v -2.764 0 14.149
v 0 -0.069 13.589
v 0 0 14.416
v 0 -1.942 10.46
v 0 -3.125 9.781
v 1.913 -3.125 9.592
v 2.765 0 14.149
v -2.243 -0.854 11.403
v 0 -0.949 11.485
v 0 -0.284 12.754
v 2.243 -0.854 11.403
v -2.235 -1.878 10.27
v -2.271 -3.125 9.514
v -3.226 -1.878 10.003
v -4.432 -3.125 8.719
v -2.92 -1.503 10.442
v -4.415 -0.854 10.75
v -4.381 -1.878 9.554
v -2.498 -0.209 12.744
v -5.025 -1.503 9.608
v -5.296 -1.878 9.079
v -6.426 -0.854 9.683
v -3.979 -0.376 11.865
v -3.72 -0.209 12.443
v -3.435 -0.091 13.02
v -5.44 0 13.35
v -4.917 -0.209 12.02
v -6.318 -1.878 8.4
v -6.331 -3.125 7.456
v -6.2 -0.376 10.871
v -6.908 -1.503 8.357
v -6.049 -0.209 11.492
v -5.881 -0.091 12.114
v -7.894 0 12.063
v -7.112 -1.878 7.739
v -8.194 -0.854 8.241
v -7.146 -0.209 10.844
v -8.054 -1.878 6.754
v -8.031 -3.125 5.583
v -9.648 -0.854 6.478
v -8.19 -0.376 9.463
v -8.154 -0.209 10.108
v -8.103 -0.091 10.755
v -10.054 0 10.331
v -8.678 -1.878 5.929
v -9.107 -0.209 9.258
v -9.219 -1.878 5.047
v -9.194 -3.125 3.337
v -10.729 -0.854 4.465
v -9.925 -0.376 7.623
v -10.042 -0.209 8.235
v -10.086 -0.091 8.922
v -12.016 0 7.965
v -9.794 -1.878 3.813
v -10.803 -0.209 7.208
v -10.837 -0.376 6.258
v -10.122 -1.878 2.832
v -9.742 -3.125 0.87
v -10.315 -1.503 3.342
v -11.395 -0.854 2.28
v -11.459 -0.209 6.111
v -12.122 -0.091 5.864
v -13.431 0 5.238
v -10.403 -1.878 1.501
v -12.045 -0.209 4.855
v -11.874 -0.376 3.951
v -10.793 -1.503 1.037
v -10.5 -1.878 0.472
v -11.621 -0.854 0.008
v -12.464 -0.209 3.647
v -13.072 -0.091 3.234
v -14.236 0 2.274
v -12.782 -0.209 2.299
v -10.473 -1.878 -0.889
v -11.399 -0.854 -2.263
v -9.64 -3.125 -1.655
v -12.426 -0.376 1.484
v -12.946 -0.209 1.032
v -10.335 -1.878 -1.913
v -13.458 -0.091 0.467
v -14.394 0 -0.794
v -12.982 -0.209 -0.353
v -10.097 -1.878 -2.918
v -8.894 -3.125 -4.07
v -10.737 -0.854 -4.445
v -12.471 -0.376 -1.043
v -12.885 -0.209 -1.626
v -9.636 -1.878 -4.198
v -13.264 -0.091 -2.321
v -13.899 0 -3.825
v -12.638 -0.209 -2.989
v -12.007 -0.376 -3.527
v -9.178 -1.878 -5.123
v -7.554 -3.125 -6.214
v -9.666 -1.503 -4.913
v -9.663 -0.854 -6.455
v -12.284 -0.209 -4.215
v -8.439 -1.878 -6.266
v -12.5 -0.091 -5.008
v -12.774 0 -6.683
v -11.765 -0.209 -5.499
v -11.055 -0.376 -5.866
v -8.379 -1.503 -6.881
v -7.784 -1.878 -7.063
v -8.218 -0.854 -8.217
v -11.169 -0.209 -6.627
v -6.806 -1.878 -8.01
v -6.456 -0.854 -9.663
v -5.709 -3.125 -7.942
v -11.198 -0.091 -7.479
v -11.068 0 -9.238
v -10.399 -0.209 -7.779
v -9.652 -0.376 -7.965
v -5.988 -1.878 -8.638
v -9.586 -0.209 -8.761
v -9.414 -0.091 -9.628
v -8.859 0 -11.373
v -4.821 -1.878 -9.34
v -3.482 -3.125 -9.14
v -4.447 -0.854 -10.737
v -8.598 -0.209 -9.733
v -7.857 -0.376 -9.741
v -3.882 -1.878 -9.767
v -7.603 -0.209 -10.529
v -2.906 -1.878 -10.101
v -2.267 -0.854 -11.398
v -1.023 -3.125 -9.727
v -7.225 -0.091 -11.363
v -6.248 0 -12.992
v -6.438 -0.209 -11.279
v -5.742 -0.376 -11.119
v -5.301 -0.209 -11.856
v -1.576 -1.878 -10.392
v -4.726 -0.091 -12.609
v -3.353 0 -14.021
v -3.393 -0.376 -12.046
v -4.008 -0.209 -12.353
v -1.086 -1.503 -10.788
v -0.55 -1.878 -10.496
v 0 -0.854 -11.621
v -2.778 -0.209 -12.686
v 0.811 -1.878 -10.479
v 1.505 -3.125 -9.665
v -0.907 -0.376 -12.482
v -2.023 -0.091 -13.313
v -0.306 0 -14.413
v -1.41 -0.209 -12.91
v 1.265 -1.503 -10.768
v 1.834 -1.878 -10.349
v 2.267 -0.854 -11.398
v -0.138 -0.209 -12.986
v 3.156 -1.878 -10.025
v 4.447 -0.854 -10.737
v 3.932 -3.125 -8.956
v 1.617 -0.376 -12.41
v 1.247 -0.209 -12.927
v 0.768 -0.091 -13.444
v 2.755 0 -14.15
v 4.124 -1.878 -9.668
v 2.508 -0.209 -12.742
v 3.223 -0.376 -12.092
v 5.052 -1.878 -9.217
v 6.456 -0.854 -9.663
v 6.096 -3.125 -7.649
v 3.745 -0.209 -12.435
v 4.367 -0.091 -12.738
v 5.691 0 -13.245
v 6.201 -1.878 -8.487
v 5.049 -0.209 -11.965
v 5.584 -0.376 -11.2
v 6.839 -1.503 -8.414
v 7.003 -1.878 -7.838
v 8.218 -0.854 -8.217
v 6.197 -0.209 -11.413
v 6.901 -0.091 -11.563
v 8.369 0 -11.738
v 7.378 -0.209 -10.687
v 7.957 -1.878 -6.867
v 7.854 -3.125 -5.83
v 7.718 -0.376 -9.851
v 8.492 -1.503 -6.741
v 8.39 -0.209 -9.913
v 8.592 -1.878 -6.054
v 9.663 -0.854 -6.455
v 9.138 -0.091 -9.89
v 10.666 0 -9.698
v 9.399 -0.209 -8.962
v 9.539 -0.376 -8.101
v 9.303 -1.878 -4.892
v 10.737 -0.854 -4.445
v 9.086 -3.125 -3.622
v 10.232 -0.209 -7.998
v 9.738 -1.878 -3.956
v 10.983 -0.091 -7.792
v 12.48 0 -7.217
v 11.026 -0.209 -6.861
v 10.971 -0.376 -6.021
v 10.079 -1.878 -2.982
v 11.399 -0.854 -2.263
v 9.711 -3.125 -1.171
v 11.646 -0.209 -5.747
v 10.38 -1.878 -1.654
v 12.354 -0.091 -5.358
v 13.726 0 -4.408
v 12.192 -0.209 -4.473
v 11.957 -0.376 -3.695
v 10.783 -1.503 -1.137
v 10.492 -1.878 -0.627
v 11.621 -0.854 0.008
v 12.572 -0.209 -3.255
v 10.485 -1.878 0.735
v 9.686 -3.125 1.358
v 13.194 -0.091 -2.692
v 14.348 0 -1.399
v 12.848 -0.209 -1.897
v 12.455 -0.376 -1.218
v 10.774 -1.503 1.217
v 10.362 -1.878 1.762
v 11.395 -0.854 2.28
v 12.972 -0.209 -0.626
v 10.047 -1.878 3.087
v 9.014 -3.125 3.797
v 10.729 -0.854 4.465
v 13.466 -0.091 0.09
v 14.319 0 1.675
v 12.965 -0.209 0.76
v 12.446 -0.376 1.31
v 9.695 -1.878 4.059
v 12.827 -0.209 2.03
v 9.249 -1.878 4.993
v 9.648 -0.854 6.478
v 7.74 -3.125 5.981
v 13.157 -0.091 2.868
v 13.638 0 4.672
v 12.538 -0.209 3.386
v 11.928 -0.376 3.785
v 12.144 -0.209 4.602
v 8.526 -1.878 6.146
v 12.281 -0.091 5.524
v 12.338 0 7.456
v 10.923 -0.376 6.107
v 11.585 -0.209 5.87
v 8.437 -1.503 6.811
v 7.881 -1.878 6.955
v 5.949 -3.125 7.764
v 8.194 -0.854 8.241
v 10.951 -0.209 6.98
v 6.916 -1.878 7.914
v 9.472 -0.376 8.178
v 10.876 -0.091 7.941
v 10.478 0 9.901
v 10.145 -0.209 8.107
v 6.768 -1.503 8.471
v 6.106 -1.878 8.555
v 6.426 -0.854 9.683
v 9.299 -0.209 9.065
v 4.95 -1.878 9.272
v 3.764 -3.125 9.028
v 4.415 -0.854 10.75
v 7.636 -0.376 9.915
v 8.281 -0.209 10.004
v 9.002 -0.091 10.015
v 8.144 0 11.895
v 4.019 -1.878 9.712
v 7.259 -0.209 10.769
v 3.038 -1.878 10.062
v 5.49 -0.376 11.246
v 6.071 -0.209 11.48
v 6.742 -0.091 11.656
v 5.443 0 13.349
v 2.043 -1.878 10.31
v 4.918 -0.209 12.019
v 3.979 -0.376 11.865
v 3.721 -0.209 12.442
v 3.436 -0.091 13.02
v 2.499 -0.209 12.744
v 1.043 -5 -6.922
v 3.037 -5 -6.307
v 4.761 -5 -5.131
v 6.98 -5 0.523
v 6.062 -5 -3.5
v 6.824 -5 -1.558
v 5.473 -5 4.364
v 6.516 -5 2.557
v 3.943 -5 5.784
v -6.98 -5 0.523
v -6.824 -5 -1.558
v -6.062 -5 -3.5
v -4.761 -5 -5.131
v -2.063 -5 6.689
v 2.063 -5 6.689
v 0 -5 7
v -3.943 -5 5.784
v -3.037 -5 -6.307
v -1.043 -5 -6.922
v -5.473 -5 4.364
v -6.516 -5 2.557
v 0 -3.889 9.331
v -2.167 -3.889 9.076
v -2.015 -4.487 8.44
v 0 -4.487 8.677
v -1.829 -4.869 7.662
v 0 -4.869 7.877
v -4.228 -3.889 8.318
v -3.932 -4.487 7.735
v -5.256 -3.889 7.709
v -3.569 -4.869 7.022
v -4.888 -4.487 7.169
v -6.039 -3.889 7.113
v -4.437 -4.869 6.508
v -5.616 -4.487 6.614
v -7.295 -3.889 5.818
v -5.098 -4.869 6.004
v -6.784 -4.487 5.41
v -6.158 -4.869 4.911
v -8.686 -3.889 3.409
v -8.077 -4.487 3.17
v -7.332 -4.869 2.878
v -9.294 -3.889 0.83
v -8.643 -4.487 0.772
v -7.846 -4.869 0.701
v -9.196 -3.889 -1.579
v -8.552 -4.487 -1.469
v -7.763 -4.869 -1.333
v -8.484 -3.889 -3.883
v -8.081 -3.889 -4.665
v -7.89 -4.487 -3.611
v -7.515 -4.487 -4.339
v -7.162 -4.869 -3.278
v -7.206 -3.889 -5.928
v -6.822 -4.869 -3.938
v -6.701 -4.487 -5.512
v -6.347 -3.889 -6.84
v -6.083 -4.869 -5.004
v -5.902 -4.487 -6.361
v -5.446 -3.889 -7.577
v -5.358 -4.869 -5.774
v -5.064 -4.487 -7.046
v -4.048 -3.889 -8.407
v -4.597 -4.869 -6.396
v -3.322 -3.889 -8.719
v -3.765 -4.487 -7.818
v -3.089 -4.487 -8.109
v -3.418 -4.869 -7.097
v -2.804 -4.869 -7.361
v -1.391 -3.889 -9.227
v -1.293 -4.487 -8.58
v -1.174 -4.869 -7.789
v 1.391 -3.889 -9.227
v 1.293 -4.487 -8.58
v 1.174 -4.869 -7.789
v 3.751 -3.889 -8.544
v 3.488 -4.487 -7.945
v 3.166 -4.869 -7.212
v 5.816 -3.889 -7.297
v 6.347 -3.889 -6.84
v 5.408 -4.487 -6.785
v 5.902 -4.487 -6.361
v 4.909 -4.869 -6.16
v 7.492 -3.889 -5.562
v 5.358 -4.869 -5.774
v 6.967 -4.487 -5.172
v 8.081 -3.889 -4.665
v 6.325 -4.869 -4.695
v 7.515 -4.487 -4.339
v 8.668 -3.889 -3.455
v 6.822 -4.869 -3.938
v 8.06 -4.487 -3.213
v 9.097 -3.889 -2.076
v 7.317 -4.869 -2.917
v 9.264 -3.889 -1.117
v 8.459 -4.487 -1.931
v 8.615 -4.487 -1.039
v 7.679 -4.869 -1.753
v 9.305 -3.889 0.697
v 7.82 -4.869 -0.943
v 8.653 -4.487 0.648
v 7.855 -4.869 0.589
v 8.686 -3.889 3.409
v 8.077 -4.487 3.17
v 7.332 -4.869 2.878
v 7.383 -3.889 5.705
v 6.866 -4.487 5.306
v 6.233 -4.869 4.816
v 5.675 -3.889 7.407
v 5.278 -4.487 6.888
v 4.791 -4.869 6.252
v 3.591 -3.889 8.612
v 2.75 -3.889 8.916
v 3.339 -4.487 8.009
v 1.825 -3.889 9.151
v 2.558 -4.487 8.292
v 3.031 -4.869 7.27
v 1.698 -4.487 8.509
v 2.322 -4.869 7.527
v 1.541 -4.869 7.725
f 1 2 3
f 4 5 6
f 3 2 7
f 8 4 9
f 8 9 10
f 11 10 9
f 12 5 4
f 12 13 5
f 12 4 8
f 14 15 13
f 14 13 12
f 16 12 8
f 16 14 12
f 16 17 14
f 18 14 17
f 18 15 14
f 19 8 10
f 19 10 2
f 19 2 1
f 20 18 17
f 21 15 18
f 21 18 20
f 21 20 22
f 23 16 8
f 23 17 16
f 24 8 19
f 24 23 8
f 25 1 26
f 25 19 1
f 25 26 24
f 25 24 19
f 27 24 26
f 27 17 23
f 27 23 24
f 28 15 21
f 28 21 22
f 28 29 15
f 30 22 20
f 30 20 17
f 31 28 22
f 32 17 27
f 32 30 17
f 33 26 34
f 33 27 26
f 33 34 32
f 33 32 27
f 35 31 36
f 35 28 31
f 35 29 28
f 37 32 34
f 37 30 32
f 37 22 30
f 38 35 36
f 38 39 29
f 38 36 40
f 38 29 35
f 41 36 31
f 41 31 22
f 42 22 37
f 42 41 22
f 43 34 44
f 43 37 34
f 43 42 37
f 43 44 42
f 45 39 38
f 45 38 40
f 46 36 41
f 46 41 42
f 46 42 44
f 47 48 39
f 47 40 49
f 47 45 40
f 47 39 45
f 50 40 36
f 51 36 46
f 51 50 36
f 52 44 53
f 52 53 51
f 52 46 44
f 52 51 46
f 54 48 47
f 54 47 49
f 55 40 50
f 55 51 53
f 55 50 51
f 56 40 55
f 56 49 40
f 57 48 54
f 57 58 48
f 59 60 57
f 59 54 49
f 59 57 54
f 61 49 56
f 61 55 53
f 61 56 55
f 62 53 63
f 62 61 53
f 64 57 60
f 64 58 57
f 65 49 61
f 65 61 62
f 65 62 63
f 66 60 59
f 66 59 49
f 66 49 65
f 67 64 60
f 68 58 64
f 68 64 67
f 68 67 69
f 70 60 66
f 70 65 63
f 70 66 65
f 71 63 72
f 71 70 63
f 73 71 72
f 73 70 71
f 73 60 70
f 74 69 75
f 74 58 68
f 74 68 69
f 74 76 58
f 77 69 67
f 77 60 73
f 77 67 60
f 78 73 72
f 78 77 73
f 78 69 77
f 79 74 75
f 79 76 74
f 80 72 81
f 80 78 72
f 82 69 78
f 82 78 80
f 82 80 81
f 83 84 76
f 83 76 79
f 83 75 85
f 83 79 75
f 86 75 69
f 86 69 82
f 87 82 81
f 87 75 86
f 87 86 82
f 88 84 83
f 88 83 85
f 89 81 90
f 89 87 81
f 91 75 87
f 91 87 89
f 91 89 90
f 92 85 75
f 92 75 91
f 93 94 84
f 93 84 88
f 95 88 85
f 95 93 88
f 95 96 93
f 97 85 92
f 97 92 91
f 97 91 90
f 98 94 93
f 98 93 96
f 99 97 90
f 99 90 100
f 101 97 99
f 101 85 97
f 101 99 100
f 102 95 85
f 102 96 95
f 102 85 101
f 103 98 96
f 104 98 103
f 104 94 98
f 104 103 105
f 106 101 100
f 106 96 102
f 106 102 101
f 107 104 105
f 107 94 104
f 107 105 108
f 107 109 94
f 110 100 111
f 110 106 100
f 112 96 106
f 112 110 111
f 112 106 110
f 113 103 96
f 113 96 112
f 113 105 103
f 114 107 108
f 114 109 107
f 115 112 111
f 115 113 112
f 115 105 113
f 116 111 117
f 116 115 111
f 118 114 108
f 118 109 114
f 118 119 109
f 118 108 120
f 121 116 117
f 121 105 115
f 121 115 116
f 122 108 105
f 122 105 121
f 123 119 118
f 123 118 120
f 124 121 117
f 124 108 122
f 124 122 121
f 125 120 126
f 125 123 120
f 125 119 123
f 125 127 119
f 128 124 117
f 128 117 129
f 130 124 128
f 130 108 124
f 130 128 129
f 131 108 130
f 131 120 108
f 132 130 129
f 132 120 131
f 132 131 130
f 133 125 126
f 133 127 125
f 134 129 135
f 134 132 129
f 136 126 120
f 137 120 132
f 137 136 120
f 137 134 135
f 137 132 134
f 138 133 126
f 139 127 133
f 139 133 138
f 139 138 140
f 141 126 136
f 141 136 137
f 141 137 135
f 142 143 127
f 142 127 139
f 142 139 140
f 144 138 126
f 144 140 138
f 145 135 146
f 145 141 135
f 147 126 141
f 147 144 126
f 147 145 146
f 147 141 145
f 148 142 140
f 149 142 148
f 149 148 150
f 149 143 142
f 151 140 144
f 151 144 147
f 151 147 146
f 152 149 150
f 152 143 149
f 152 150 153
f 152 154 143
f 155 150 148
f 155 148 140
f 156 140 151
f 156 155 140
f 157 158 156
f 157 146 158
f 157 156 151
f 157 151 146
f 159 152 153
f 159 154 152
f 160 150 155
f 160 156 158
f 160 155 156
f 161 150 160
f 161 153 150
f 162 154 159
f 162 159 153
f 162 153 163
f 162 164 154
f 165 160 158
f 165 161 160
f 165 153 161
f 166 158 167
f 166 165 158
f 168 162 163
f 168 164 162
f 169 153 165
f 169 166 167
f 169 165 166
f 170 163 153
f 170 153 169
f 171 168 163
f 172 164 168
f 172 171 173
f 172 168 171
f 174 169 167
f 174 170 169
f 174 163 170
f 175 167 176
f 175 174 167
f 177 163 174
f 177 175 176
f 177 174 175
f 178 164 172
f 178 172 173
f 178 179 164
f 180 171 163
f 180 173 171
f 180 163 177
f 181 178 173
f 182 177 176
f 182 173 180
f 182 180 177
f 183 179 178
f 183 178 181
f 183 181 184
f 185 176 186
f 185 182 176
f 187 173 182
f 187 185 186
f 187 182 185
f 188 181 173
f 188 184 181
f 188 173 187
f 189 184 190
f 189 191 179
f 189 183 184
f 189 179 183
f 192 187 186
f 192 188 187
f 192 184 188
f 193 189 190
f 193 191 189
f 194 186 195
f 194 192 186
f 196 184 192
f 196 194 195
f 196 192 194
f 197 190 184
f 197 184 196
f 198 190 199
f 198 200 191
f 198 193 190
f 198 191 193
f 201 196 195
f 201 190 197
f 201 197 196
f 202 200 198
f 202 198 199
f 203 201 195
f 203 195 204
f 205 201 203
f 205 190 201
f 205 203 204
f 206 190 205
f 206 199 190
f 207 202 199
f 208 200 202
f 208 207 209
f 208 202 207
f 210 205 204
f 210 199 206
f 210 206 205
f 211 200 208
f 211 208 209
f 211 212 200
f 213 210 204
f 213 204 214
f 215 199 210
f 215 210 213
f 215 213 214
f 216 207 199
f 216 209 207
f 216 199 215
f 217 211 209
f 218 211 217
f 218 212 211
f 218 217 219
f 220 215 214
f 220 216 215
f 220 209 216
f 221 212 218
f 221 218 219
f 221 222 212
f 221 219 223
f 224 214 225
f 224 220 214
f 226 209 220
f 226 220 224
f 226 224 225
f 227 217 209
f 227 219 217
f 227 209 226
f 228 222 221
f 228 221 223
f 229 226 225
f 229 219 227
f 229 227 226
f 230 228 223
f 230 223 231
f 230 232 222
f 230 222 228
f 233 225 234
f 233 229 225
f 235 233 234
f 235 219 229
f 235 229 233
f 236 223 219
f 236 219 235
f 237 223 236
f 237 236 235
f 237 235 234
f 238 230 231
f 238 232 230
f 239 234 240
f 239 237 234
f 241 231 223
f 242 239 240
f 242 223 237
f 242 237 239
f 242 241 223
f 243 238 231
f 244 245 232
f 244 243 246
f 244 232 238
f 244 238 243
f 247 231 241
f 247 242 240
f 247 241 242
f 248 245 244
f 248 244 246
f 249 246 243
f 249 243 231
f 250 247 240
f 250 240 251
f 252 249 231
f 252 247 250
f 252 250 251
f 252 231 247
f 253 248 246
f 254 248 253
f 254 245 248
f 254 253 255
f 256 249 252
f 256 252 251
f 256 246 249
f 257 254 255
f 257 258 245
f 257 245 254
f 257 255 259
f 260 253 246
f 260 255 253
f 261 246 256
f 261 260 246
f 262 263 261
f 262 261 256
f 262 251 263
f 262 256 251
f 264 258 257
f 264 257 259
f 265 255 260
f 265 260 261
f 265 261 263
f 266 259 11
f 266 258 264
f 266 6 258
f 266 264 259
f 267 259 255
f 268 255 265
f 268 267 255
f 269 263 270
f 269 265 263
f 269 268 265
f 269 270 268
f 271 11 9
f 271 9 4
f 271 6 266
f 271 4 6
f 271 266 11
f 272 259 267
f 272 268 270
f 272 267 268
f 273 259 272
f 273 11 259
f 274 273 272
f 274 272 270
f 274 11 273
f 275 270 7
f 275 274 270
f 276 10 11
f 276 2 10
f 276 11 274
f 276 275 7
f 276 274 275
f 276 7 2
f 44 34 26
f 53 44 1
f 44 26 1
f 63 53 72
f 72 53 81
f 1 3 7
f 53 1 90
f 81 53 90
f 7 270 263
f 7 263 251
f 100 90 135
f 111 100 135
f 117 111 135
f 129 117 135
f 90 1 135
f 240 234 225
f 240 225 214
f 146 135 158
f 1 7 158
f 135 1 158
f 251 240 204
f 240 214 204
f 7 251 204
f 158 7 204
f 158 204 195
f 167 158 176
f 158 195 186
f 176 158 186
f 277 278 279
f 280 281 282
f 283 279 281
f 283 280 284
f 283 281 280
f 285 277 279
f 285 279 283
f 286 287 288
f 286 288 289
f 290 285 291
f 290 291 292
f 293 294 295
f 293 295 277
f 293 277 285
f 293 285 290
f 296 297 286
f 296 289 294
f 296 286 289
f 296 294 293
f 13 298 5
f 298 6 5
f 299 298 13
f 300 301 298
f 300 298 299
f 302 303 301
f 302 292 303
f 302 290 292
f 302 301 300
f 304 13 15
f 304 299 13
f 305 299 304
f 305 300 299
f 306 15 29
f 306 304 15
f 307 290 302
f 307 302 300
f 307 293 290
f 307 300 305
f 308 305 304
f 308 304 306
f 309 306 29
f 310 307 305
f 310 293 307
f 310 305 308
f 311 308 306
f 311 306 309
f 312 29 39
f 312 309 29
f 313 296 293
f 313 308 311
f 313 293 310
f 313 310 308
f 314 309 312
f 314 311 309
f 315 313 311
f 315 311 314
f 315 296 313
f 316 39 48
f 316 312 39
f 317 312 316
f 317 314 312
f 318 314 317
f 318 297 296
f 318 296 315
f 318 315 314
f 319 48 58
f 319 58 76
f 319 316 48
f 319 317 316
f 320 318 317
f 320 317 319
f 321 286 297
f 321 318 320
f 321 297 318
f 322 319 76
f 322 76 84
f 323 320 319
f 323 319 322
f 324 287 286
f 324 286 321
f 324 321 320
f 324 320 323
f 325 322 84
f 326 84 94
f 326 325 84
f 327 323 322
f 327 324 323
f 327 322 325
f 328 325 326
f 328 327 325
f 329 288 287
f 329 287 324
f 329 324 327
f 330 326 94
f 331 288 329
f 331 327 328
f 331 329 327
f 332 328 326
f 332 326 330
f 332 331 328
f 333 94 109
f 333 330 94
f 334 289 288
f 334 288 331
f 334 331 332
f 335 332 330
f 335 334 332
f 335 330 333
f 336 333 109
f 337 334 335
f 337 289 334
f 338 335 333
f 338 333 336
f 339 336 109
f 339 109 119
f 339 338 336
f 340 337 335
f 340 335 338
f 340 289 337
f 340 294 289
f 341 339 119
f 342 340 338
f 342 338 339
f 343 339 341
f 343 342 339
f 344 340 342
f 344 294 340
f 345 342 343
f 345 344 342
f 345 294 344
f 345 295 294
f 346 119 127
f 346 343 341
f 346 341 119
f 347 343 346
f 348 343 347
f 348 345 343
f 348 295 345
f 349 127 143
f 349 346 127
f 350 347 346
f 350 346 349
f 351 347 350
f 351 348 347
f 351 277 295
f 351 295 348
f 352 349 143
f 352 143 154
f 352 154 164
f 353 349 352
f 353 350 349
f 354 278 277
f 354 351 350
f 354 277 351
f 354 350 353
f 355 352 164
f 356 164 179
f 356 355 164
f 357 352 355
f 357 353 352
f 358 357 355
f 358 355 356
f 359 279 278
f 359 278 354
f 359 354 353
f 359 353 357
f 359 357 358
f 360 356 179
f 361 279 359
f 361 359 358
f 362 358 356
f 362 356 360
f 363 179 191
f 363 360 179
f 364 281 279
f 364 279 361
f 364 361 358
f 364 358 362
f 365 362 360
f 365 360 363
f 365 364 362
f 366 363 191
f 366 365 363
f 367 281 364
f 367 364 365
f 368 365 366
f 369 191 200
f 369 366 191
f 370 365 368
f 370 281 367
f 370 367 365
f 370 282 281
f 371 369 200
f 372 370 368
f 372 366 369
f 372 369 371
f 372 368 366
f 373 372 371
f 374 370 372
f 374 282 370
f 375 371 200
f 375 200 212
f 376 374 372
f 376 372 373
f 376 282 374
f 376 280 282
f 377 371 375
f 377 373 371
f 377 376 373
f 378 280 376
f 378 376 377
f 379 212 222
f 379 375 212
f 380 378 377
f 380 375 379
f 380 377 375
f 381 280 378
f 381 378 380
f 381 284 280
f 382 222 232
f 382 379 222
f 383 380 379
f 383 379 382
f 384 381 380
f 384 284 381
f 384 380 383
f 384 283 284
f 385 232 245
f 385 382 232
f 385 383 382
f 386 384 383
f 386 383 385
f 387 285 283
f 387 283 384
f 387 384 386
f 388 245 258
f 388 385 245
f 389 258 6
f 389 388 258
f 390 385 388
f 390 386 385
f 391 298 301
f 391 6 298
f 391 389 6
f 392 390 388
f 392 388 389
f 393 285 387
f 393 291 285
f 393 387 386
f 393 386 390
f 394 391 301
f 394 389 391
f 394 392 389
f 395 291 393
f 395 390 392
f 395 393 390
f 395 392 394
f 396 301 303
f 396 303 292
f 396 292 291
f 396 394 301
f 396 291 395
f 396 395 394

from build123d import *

# Parameters (mm, degrees)
SKETCH1_W           = 203.69051182
SKETCH1_H           = 2
BASE_EXTRUDE_DEPTH  = 60
SKETCH3_R           = 10
BOSS_EXTRUDE1_DEPTH = 5
FILLET_2_R          = 3
FILLET2_R           = 5
SKETCH4_W           = 120
SKETCH4_H           = 2
CUT_EXTRUDE1_DEPTH  = 213.402506245


with BuildPart() as part:
    # Sketch1 → Base-Extrude (new, symmetric)
    with BuildSketch(Plane.XY):
        with Locations((0, 1)):
            Rectangle(SKETCH1_W, SKETCH1_H)
    extrude(amount=BASE_EXTRUDE_DEPTH, both=True)

    # Sketch3 → Boss-Extrude1 (add)
    with BuildSketch(Plane.XZ):
        with Locations(Location((0, 0, 0), (0, 0, 90))):
            Circle(SKETCH3_R)
    extrude(amount=BOSS_EXTRUDE1_DEPTH)

    # Fillet 2
    fillet_2_edges = [part.edges().sort_by_distance(p)[0] for p in [
        (0, -5, -10),
    ]]
    fillet(fillet_2_edges, radius=FILLET_2_R)

    # Fillet2
    fillet2_edges = [part.edges().sort_by_distance(p)[0] for p in [
        (0, 0, -10),
    ]]
    fillet(fillet2_edges, radius=FILLET2_R)

    # Sketch4 → Cut-Extrude1 (cut, through all)
    with BuildSketch(Plane(origin=(101.84525591, 0, 0), x_dir=(0, 0, -1), z_dir=(1, 0, 0))):
        with Locations((0, 1)):
            Rectangle(SKETCH4_W, SKETCH4_H)
    extrude(amount=-CUT_EXTRUDE1_DEPTH, mode=Mode.SUBTRACT)


solid = part.part
